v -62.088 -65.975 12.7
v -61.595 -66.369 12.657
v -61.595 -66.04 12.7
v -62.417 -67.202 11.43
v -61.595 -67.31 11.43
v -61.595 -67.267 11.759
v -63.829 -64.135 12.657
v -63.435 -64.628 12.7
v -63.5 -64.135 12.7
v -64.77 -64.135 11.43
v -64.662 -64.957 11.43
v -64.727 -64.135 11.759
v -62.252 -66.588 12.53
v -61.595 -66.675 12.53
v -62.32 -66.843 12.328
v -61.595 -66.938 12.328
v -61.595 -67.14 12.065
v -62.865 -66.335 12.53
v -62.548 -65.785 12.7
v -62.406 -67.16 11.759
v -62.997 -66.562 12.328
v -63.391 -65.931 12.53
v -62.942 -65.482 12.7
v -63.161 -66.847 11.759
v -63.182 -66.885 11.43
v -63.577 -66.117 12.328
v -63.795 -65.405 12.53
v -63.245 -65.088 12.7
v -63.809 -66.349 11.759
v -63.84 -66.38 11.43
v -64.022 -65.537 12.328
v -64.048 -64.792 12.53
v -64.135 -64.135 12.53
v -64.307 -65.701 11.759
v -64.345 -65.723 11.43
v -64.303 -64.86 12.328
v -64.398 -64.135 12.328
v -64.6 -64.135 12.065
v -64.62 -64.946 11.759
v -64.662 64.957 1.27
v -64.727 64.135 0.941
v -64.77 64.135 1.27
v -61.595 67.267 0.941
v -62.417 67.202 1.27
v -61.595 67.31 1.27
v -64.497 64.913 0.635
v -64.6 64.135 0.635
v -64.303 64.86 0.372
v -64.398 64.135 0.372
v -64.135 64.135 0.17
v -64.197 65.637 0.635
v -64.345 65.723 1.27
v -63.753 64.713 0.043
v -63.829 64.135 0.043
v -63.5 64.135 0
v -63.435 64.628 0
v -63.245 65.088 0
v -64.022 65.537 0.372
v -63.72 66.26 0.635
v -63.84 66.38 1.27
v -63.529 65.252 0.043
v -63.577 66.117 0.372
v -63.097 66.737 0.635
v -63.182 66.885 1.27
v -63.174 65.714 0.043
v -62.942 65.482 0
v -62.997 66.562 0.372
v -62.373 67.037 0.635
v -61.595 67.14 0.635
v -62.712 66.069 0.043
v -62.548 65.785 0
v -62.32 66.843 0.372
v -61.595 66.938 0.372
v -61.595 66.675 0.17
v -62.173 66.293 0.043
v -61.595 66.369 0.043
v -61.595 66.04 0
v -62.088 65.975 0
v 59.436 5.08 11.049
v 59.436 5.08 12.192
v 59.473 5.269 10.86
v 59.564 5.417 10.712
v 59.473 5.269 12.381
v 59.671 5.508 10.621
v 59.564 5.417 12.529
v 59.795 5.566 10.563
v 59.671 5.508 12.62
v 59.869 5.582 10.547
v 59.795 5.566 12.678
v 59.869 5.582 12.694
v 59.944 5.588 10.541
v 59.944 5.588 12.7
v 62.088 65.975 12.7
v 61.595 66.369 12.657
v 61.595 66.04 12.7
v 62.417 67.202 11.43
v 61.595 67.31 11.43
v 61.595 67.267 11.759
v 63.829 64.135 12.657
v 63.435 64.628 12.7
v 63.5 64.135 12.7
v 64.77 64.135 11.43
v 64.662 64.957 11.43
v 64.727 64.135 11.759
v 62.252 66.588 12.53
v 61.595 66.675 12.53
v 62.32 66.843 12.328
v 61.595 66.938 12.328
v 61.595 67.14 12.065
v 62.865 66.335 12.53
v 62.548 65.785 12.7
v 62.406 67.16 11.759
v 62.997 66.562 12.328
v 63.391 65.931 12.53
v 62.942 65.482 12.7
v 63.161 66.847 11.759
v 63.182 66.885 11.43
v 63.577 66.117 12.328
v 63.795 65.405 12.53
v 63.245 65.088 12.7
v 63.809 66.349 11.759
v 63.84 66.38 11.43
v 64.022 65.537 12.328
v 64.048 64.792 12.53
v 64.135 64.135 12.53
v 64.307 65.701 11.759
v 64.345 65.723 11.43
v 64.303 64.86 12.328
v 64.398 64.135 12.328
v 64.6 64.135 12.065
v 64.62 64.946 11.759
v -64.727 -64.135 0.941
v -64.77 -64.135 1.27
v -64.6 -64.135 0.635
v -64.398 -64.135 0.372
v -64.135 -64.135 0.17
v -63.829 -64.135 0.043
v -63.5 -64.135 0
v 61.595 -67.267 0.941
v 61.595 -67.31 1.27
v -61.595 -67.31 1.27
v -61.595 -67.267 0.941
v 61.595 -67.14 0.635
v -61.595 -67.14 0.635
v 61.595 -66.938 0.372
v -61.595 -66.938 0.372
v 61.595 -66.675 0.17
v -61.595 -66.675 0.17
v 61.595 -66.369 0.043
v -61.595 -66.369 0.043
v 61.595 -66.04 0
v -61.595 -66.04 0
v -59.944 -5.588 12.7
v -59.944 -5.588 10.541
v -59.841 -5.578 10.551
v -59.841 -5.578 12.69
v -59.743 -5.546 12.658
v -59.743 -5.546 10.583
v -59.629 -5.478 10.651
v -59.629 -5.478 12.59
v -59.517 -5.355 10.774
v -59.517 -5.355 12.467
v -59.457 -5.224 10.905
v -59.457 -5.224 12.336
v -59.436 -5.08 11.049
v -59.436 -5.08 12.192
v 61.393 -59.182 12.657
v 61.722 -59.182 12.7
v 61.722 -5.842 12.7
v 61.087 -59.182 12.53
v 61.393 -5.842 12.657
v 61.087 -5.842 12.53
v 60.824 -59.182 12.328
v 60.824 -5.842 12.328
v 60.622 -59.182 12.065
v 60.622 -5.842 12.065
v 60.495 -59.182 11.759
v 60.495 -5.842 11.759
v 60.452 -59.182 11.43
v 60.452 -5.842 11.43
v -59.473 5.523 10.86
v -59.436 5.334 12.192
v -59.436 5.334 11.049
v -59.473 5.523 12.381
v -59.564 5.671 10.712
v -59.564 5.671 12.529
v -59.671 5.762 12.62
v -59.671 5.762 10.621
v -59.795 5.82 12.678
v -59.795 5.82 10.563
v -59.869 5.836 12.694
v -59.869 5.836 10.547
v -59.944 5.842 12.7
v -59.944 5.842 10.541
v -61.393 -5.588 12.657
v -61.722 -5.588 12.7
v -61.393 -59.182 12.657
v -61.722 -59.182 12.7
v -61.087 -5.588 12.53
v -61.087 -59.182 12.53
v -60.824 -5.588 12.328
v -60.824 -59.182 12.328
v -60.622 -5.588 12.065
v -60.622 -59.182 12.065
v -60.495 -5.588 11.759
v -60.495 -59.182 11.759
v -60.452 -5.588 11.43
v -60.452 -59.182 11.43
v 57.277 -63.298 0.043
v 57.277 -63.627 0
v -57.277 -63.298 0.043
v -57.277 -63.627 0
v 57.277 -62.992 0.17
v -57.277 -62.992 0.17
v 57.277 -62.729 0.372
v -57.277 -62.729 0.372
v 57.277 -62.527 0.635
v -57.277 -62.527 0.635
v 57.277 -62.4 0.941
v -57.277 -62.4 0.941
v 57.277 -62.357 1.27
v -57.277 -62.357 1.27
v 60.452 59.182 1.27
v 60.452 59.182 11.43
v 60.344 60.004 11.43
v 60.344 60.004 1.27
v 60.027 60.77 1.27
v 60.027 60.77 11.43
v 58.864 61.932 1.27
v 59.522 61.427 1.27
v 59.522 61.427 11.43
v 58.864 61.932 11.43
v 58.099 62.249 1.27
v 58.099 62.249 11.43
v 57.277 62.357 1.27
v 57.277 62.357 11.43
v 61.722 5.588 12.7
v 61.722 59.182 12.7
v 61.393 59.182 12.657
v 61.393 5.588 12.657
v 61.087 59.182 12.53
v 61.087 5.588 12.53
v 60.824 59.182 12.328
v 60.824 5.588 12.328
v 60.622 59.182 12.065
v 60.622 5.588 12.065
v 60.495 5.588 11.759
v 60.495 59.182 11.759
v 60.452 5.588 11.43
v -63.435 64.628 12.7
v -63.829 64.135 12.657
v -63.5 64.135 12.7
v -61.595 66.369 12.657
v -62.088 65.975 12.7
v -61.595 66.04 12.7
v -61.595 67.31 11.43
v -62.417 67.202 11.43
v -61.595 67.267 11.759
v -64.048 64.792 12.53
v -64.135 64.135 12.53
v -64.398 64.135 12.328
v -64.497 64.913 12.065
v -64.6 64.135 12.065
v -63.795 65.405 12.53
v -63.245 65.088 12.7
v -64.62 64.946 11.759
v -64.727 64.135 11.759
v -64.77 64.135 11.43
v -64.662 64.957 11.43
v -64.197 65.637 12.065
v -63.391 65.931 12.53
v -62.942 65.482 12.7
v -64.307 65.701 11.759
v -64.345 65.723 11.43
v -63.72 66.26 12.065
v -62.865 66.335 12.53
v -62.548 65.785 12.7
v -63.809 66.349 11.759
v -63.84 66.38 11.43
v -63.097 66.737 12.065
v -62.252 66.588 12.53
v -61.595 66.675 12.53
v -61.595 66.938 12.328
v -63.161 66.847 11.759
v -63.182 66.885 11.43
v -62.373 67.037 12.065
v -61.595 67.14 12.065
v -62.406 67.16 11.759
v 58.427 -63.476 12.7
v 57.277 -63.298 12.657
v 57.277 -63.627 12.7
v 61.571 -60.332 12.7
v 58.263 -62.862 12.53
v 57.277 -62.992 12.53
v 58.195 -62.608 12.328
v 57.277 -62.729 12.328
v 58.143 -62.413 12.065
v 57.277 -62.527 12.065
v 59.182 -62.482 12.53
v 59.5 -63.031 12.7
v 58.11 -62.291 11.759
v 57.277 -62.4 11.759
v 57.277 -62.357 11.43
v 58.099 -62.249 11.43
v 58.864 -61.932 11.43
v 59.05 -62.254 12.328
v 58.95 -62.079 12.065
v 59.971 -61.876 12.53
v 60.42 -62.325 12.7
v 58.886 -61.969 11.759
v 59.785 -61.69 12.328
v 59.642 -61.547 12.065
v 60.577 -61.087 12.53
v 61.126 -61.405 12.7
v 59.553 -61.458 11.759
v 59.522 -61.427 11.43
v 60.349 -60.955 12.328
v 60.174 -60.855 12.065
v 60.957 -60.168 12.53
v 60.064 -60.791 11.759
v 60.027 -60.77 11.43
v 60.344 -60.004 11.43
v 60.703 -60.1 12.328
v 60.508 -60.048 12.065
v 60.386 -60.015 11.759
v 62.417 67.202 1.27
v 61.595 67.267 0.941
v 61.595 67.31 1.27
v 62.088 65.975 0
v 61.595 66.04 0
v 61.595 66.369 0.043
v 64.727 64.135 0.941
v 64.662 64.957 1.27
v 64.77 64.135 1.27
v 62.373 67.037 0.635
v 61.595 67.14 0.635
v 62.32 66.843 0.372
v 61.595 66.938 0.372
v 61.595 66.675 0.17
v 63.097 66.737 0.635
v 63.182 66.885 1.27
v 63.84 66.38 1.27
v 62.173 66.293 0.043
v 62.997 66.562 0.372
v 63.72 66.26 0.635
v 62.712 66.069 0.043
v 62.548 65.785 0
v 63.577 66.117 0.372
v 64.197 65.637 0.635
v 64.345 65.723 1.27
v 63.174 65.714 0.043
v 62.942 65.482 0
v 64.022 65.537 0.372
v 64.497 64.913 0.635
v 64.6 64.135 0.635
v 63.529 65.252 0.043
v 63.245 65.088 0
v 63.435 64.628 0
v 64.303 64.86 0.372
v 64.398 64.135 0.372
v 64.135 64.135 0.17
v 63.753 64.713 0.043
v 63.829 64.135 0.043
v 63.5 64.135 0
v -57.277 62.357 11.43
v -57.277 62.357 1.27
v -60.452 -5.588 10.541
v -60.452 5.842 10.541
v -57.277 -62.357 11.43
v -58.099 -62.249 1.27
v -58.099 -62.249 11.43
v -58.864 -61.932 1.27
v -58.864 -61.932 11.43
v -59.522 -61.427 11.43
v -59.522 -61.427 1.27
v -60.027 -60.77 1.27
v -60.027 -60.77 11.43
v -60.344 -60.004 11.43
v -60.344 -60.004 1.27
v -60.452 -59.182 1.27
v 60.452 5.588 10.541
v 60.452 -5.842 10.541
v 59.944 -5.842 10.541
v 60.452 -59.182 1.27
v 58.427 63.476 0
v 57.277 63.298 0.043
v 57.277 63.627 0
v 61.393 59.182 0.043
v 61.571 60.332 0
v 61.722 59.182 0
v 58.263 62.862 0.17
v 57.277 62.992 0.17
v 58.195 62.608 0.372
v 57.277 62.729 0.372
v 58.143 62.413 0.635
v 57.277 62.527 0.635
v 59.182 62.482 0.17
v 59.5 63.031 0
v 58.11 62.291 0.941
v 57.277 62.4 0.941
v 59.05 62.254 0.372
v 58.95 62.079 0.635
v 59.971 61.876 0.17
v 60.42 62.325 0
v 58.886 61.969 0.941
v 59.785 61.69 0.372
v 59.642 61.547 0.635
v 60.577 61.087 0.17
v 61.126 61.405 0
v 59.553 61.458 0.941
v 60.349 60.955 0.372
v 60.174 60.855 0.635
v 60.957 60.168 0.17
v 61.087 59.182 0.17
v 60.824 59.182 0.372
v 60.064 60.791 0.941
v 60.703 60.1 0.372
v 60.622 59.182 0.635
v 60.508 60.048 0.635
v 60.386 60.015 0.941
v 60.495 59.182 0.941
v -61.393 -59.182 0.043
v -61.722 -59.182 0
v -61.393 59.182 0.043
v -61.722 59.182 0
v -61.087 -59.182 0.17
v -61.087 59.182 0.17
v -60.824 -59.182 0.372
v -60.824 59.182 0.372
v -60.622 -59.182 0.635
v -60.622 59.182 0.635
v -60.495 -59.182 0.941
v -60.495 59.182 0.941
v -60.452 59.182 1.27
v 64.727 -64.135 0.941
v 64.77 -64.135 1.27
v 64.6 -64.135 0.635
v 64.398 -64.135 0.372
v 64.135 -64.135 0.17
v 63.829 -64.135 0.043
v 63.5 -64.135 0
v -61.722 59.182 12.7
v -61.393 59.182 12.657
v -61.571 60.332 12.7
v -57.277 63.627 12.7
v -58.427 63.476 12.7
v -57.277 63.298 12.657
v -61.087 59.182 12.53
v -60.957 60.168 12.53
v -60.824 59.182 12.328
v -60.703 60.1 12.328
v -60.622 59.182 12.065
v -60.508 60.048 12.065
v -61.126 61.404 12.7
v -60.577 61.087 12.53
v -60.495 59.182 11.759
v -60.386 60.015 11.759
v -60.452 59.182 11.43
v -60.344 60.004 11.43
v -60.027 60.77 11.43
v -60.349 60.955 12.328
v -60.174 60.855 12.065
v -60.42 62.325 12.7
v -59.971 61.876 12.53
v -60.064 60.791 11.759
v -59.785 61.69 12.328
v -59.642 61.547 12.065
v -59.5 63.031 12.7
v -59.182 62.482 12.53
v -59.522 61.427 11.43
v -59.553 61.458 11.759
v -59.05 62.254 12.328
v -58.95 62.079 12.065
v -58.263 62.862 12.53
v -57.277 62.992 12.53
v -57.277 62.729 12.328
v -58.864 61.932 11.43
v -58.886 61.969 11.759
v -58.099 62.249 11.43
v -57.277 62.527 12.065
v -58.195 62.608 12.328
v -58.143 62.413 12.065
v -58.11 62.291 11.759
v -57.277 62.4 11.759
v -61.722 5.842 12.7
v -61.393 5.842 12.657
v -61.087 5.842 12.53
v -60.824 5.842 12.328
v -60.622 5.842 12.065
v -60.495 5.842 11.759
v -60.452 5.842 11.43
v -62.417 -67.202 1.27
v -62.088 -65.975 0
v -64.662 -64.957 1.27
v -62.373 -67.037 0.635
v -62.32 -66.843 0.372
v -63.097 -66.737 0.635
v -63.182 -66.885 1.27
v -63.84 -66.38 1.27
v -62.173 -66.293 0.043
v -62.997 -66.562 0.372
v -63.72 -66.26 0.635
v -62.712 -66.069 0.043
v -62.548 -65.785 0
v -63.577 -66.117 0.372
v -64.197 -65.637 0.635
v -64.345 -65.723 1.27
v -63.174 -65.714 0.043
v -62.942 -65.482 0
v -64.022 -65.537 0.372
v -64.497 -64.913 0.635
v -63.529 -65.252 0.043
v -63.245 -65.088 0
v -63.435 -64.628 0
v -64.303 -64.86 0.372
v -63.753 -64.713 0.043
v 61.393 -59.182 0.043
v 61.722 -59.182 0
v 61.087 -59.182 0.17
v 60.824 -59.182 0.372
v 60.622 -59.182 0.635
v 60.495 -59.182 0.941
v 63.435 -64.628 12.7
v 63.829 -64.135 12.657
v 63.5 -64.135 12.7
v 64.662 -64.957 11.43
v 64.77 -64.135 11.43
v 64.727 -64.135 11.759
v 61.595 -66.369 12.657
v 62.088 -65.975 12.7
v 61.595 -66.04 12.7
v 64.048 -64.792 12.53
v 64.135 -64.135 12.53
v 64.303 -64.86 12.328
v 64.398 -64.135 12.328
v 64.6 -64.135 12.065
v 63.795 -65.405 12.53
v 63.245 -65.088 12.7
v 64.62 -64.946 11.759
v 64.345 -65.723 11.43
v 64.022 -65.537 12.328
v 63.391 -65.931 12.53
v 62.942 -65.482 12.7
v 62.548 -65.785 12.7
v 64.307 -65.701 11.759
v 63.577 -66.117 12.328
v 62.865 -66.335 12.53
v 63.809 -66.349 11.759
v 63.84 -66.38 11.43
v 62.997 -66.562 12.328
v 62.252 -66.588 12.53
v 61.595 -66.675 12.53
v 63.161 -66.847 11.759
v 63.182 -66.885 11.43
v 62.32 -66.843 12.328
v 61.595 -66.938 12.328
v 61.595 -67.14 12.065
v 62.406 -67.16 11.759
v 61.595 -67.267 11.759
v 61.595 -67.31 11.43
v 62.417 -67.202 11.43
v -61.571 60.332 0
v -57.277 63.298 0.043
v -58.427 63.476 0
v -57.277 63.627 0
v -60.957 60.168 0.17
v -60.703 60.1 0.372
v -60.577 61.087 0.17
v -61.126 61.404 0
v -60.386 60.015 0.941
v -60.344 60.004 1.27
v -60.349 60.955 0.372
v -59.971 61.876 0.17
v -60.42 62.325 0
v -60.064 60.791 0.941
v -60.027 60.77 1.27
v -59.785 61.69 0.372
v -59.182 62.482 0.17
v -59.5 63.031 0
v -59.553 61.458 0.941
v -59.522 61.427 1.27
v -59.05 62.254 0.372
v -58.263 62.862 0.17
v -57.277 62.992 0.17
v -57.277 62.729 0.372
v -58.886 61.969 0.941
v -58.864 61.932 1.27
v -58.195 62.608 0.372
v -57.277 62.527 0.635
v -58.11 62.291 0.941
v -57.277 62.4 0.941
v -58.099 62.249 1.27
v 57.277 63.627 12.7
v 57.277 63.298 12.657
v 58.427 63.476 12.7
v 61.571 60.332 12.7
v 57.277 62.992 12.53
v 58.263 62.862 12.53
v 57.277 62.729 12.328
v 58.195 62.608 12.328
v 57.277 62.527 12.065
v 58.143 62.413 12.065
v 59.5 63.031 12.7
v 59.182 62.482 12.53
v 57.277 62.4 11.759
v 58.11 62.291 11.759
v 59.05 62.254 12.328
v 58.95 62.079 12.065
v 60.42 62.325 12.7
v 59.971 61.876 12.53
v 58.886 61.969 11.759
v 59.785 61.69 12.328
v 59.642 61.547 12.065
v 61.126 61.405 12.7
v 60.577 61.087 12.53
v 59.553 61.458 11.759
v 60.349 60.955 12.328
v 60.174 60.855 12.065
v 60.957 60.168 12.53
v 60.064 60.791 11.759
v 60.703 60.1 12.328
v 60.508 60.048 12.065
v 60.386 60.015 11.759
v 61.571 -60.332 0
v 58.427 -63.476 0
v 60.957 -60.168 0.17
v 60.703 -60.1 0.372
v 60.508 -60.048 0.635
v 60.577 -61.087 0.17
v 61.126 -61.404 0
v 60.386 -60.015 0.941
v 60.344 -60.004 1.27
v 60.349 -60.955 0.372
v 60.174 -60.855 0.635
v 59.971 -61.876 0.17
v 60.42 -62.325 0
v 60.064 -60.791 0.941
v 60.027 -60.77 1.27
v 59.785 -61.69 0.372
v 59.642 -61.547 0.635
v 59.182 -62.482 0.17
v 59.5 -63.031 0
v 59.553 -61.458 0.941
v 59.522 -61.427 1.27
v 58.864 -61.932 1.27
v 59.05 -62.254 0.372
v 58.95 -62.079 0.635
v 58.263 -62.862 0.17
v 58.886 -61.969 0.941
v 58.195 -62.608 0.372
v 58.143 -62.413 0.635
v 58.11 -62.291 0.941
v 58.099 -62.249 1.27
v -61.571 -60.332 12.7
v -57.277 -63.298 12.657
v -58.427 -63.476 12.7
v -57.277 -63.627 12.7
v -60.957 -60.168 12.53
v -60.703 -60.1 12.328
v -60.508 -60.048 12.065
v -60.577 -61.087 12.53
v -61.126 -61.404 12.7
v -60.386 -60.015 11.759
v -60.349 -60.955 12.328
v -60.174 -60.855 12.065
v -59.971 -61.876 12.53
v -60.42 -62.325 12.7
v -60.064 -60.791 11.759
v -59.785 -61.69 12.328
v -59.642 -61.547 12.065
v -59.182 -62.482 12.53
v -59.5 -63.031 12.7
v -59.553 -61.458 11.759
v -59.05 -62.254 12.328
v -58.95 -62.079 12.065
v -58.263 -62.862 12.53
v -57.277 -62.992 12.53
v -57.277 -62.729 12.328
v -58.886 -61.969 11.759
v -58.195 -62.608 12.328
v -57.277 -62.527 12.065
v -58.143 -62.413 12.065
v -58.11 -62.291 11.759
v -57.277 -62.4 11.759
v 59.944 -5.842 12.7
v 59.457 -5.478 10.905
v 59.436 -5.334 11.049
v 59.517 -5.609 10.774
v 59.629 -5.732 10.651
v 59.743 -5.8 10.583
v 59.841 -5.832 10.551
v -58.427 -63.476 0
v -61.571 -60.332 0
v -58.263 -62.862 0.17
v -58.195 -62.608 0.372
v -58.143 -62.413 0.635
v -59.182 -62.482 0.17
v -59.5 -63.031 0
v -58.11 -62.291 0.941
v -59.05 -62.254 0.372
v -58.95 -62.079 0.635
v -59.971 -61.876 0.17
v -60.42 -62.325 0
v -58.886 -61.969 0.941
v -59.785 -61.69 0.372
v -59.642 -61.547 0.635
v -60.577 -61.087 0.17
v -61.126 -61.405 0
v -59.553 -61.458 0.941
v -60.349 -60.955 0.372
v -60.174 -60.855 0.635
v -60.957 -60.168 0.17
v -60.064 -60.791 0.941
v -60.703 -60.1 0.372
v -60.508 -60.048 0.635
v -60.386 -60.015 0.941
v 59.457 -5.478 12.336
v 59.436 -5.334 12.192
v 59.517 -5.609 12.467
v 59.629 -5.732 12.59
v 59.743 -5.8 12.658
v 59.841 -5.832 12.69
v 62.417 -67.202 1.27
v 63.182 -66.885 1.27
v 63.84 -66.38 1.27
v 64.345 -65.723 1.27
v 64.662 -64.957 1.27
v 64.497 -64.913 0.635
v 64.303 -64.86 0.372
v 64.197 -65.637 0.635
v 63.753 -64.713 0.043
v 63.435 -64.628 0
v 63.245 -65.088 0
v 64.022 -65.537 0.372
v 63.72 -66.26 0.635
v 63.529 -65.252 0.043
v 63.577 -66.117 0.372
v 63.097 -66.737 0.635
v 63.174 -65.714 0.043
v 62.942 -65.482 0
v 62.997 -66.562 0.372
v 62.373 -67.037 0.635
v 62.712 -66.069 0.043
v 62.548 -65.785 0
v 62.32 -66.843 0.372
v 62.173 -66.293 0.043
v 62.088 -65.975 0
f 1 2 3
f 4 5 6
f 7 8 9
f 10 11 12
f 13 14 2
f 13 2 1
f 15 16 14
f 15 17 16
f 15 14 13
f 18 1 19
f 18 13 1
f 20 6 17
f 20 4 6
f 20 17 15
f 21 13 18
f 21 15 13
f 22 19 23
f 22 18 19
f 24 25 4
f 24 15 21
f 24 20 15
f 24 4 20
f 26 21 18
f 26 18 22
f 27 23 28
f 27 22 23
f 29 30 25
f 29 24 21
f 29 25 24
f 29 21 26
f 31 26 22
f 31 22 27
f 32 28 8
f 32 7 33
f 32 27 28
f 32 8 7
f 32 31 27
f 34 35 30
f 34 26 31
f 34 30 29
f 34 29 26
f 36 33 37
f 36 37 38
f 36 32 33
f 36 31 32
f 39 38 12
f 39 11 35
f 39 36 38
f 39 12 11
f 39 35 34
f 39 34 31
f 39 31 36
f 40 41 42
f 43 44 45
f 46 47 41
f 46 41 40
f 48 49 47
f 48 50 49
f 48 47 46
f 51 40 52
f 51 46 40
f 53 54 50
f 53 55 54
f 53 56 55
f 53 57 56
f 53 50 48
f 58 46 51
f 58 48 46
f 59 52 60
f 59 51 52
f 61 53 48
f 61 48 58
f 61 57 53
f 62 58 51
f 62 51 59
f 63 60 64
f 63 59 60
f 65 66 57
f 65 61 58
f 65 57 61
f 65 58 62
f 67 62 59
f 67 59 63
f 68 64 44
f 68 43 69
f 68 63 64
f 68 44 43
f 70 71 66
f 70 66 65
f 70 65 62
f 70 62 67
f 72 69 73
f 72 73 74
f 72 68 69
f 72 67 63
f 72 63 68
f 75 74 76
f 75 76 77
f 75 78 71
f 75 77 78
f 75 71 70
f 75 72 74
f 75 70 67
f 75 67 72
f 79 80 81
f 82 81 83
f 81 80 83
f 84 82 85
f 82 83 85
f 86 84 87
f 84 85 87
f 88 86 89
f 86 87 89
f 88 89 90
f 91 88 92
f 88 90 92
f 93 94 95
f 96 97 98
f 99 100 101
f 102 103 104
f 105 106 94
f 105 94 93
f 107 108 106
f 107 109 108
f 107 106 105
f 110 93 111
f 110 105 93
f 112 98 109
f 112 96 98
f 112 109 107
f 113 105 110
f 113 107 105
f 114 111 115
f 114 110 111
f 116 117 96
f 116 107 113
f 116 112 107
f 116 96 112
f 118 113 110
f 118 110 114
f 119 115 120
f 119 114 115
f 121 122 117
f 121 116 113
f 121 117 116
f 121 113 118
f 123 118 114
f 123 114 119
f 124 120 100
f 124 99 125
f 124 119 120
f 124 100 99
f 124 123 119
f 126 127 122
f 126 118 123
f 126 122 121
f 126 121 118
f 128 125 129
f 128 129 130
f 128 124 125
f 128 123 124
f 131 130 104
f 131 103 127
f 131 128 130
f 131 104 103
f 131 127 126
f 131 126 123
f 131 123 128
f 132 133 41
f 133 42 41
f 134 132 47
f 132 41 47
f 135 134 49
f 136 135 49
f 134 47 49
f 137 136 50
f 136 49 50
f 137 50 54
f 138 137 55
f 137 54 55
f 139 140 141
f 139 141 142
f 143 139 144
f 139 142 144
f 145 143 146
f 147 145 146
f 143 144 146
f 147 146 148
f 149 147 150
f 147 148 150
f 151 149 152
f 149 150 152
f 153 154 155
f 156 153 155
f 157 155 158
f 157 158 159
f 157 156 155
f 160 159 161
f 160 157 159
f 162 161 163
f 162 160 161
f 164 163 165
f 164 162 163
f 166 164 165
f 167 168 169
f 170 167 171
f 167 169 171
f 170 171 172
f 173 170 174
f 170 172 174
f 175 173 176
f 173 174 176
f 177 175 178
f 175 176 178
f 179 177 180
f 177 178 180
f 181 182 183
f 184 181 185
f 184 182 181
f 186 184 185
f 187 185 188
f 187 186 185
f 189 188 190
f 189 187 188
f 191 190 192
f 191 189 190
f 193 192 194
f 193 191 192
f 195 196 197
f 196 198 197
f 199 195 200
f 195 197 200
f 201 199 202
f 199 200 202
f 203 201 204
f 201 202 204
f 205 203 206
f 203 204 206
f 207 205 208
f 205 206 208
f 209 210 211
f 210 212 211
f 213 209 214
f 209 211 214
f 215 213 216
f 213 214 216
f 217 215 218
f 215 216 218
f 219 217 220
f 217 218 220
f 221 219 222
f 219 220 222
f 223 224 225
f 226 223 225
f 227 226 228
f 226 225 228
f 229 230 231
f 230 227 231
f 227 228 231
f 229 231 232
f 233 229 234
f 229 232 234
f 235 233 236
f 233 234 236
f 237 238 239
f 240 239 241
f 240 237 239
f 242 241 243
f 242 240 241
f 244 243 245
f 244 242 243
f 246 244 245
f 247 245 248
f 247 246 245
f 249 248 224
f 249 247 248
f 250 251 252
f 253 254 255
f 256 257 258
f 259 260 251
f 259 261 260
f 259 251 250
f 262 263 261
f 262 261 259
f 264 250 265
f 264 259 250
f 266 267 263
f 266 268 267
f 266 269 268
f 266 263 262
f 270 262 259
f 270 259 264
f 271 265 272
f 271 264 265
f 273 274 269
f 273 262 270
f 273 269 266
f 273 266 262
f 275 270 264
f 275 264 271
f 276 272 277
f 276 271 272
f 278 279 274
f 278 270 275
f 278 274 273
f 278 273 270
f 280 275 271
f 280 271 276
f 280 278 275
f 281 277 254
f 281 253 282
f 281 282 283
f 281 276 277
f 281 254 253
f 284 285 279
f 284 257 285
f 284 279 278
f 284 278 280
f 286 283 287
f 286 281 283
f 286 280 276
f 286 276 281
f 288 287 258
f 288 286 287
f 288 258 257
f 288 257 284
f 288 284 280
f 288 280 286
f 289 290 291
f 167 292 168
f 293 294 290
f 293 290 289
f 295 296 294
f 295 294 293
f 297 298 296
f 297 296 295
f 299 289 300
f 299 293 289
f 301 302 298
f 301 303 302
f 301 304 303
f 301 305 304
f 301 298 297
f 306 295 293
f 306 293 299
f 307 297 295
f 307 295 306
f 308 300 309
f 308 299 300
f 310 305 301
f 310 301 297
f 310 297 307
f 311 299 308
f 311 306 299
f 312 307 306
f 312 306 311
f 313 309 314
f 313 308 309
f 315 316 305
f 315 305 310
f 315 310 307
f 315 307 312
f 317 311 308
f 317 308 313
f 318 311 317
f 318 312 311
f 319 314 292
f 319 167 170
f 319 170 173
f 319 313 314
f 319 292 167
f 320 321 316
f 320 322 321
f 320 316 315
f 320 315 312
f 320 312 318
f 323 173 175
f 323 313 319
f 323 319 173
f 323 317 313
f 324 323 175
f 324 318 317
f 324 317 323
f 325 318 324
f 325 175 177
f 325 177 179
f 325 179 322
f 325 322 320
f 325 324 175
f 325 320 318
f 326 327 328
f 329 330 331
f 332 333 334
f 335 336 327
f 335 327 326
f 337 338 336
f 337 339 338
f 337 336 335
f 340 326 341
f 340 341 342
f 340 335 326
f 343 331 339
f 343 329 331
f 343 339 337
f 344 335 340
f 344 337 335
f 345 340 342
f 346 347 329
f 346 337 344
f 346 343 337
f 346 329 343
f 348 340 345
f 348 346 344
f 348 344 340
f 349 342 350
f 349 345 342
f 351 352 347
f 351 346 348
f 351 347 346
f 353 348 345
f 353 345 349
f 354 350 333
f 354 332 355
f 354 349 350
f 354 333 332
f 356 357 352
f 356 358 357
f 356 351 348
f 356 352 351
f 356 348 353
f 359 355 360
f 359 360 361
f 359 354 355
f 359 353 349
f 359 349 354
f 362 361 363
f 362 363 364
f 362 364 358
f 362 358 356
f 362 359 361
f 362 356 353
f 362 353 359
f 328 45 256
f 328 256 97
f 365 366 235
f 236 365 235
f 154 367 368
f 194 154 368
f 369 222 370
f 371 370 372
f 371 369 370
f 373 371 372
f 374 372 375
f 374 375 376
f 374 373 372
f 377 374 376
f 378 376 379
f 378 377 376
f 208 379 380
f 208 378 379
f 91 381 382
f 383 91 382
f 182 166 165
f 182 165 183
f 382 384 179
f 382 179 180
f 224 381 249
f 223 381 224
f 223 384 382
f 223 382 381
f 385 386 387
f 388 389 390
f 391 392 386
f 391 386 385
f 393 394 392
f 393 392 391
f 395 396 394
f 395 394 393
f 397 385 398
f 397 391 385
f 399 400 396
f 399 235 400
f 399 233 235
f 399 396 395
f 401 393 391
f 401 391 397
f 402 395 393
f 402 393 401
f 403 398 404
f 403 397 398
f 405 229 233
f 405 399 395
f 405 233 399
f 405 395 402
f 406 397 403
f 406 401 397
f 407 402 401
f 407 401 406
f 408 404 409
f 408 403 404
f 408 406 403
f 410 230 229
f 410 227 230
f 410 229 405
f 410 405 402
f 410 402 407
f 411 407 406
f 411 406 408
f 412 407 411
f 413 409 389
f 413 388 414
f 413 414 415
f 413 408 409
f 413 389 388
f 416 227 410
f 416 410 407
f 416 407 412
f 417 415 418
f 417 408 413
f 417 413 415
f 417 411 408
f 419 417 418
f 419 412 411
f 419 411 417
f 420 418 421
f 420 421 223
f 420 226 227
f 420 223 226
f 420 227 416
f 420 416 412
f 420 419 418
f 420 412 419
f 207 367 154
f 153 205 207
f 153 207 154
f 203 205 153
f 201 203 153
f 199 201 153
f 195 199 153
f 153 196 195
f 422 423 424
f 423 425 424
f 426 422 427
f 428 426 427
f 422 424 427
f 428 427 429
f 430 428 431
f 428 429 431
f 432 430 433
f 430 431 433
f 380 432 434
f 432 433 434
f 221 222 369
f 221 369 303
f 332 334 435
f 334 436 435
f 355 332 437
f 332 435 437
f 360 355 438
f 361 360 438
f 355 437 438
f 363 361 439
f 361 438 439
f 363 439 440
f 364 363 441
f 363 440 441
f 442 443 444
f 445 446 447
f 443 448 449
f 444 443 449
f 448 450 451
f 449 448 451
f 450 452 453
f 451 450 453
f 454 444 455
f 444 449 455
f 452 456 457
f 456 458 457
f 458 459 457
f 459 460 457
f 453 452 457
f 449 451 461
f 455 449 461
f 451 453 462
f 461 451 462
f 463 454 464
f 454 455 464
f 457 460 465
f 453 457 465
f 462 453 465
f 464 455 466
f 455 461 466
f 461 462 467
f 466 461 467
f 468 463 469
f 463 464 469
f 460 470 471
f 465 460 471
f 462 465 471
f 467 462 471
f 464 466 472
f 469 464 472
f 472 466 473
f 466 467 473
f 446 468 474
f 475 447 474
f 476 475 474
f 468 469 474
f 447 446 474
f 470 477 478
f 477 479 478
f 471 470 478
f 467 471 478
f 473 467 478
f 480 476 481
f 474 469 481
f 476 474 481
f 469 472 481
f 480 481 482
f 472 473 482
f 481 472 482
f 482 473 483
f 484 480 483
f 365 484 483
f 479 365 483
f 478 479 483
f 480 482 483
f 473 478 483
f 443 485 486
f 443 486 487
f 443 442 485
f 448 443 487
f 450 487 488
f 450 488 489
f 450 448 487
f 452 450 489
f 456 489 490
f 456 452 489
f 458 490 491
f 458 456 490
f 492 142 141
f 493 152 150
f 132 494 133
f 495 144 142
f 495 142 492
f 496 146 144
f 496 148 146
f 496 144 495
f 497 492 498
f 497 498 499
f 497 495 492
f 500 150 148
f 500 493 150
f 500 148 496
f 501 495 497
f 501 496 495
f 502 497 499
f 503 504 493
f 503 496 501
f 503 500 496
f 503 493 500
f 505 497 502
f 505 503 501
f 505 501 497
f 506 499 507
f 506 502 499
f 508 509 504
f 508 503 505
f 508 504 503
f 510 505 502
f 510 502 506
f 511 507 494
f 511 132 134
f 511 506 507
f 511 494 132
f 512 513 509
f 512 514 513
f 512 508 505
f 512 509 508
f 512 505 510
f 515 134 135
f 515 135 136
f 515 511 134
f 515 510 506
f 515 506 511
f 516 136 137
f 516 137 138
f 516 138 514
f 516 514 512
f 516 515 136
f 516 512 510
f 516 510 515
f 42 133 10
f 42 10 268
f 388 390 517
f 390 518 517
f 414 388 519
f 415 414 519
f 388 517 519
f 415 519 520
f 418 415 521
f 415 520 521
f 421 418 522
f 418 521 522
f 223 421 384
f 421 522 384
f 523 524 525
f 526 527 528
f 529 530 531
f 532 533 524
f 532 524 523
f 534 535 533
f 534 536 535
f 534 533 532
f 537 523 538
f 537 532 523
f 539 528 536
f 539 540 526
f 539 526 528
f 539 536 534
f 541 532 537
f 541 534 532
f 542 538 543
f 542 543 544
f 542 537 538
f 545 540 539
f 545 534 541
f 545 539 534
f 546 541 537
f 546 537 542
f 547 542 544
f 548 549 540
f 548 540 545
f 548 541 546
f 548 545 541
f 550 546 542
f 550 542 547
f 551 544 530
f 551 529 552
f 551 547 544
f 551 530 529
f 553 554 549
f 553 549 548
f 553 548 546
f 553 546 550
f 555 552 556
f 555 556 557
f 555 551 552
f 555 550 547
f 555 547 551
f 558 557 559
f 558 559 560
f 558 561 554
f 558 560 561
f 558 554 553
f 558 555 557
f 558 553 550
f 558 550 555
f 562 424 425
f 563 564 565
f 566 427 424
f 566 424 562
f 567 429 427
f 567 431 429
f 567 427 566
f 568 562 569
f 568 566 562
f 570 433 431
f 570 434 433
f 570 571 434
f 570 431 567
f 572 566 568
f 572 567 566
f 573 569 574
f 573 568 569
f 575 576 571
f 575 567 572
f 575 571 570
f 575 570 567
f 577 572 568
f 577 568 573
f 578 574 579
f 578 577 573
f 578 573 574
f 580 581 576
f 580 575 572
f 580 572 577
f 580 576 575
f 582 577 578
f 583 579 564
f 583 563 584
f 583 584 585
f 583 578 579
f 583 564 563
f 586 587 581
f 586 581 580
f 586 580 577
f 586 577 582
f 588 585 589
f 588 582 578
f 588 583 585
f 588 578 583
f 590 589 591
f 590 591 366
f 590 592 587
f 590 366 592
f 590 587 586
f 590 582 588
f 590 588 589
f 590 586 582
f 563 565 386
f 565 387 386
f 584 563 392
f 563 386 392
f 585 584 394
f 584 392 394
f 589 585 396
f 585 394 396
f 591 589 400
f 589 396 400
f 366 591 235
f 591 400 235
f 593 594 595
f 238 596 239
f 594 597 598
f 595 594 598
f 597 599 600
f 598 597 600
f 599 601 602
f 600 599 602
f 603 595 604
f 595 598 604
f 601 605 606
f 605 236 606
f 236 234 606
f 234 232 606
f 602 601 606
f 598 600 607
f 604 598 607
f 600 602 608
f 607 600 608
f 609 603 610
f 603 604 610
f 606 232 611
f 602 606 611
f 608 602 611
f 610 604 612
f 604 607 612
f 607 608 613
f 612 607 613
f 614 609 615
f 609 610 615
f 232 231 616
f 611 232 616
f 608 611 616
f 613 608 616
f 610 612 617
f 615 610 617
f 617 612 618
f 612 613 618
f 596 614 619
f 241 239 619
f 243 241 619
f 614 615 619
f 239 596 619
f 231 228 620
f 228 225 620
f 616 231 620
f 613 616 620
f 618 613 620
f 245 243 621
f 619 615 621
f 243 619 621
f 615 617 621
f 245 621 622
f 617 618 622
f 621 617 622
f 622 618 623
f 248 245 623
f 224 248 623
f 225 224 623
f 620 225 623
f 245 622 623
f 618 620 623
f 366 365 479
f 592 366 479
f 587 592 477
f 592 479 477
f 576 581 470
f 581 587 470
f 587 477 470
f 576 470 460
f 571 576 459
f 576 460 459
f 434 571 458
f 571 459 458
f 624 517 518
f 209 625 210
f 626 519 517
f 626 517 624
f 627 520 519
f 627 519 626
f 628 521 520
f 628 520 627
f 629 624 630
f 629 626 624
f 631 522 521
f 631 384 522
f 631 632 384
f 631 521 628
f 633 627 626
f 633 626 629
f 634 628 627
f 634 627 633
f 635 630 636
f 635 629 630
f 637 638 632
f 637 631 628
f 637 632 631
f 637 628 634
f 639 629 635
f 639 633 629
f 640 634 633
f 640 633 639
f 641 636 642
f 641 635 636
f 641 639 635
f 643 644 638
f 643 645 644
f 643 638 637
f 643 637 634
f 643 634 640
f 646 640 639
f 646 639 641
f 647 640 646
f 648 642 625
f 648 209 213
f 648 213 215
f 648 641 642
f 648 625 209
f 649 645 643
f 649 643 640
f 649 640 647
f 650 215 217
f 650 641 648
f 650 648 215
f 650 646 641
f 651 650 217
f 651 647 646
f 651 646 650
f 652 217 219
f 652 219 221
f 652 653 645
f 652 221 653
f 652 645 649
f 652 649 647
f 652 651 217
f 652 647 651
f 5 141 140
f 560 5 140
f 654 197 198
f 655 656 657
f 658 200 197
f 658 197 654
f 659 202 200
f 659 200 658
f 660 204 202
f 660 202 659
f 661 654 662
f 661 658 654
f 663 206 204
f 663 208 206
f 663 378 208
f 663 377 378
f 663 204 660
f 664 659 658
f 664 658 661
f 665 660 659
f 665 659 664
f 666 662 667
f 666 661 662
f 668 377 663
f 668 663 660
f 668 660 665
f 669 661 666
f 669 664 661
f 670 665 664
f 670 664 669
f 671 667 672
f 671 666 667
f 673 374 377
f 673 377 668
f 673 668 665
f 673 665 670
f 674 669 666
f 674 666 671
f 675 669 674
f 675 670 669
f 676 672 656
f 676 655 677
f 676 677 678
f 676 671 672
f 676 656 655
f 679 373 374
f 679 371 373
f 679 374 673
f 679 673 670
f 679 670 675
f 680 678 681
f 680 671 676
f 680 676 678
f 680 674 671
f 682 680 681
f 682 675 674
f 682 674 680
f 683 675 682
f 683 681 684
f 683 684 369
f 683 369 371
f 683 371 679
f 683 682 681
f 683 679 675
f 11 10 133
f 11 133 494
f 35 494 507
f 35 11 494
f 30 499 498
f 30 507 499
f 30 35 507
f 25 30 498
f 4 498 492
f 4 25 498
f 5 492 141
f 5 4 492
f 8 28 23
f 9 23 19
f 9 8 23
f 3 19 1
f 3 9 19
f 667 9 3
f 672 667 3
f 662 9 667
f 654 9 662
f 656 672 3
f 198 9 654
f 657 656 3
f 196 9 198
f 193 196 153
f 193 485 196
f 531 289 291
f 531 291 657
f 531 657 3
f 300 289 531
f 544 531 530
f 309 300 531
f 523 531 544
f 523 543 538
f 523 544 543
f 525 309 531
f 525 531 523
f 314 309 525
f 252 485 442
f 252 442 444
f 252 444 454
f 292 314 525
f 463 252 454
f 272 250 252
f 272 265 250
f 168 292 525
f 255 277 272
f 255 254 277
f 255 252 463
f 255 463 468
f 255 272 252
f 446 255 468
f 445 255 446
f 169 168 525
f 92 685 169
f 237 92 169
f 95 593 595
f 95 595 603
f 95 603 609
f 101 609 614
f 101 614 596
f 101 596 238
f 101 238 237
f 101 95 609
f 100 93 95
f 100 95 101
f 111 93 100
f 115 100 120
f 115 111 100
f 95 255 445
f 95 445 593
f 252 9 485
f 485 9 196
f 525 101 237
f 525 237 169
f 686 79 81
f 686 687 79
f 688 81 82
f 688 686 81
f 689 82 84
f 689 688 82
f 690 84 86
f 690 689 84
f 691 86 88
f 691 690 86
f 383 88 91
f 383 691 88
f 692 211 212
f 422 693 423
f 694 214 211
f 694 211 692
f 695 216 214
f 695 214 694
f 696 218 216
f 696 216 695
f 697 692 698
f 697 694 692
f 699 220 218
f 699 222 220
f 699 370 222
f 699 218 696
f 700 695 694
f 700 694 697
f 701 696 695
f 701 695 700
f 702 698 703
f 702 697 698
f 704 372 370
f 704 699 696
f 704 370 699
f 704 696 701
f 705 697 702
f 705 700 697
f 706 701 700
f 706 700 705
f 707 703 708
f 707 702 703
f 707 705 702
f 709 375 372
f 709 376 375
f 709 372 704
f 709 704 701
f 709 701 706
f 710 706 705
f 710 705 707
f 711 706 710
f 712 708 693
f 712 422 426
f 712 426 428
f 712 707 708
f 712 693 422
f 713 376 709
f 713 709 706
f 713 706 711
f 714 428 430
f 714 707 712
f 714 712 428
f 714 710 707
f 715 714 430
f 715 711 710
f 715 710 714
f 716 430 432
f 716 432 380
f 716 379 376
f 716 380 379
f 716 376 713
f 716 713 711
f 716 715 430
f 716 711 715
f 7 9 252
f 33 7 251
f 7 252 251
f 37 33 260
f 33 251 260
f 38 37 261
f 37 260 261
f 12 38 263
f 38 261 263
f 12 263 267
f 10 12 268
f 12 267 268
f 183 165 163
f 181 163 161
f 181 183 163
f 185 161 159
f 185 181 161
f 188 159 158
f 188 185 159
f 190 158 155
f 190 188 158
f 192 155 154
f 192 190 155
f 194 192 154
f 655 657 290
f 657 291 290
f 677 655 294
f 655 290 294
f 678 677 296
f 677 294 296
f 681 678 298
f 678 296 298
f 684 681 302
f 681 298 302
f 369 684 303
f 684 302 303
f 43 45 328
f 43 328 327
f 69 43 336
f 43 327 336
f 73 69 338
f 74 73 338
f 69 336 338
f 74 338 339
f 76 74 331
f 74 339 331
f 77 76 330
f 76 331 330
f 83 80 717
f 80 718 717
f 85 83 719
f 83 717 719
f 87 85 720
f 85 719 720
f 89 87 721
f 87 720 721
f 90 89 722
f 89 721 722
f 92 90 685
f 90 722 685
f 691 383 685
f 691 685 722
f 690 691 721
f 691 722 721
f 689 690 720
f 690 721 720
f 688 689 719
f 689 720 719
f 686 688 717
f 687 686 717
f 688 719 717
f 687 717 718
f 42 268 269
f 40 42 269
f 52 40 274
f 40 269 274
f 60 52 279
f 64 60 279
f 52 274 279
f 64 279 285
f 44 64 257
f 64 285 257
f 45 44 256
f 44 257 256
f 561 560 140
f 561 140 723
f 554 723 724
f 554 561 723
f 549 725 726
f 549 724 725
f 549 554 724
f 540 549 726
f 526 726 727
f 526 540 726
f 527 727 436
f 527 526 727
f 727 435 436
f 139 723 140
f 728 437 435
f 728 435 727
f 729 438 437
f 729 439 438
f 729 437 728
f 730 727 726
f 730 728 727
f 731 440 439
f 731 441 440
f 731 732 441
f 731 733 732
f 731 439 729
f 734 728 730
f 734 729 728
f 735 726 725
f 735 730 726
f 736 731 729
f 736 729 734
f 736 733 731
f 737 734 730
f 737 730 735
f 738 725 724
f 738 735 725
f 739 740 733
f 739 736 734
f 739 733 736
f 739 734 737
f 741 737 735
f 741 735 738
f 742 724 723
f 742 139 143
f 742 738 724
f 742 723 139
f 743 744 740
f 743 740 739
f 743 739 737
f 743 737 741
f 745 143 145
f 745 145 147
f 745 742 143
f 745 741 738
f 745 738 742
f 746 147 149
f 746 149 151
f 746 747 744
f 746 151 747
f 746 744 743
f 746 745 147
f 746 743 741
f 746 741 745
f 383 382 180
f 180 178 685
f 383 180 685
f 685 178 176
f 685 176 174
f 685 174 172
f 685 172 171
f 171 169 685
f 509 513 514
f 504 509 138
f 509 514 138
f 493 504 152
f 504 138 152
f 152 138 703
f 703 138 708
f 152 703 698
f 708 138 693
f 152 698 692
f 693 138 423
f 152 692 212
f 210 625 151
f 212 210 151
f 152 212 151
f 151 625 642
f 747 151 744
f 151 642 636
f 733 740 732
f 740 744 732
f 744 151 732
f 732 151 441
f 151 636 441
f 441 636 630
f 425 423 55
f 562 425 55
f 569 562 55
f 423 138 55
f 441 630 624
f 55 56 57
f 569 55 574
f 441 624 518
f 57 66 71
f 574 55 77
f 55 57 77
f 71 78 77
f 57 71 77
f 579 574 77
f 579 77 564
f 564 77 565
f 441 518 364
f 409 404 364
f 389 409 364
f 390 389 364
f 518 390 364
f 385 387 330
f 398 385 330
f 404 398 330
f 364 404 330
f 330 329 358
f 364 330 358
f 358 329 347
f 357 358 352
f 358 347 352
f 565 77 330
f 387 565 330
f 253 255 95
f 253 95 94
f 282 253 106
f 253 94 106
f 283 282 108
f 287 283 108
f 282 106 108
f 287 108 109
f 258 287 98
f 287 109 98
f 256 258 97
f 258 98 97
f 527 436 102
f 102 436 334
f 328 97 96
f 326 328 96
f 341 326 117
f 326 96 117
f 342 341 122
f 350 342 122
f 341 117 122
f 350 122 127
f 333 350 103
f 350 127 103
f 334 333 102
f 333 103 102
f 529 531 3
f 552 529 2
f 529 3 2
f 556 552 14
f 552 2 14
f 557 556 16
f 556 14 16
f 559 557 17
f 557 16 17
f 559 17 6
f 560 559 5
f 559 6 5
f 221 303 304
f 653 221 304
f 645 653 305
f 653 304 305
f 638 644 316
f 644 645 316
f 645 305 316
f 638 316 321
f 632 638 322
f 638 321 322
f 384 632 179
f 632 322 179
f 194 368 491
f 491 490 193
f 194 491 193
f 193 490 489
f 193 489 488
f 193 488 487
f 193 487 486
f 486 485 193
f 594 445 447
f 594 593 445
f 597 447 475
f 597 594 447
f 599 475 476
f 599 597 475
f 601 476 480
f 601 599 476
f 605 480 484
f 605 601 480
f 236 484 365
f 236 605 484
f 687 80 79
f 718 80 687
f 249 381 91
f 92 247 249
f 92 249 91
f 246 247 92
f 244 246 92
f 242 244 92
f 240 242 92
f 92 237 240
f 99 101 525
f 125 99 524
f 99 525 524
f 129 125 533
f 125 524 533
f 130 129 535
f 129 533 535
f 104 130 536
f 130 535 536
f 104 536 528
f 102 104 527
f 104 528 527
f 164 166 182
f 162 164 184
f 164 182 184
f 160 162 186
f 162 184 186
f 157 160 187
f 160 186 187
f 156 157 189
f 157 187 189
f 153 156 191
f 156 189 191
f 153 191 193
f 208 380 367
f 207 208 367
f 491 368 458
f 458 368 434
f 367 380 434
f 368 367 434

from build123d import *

# Parameters (mm, degrees)
F0_W     = 129.54
F0_H     = 134.62
F0_W_2   = 120.904
F0_H_2   = 124.714
F1_DEPTH = 12.7
F2_R     = 3.175
F4_W     = 11.43
F4_H     = 2.159
F5_DEPTH = 1.016
F3_W     = 11.43
F3_H     = 2.159
F6_DEPTH = 1.016
F7_R     = 1.27
F8_R     = 0.508
F10_R    = 1.27


with BuildPart() as f1:
    # F0 (on Top) → F1 (new body)
    with BuildSketch(Plane.XY):
        Rectangle(F0_W, F0_H)
        Rectangle(F0_W_2, F0_H_2, mode=Mode.SUBTRACT)
    extrude(amount=F1_DEPTH)

    # F2
    f2_edges = [f1.edges().sort_by_distance(p)[0] for p in [
        (-60.452, 62.357, 6.35),
        (-60.452, -62.357, 6.35),
        (60.452, 62.357, 6.35),
        (60.452, -62.357, 6.35),
        (-64.77, 67.31, 6.35),
        (64.77, 67.31, 6.35),
        (-64.77, -67.31, 6.35),
        (64.77, -67.31, 6.35),
    ]]
    fillet(f2_edges, radius=F2_R)

    # F4 (on face) → F5 (join)
    with BuildSketch(Plane(origin=(60.452, 0, 0), x_dir=(0, -1, 0), z_dir=(-1, 0, 0))):
        with Locations((0.127, 11.6205)):
            Rectangle(F4_W, F4_H)
    extrude(amount=F5_DEPTH)

    # F3 (on face) → F6 (join)
    with BuildSketch(Plane.YZ.offset(-60.452)):
        with Locations((0.127, 11.6205)):
            Rectangle(F3_W, F3_H)
    extrude(amount=F6_DEPTH)

    # F7
    f7_edges = [f1.edges().sort_by_distance(p)[0] for p in [
        (0, -62.357, 12.7),
        (0, 62.357, 0),
        (-64.77, 0, 0),
        (-60.452, 32.512, 12.7),
    ]]
    fillet(f7_edges, radius=F7_R)

    # F8
    f8_edges = [f1.edges().sort_by_distance(p)[0] for p in [
        (-59.436, 5.842, 11.6205),
        (-59.436, -5.588, 11.6205),
        (-59.436, 0.127, 10.541),
        (-59.436, 0.127, 12.7),
        (59.436, 5.588, 11.6205),
        (59.436, -5.842, 11.6205),
        (59.436, -0.127, 12.7),
        (59.436, -0.127, 10.541),
    ]]
    fillet(f8_edges, radius=F8_R)

    # F10
    f10_edges = [f1.edges().sort_by_distance(p)[0] for p in [
        (0, 67.31, 12.7),
        (-63.840064, 66.380064, 12.7),
        (-64.77, 0, 12.7),
        (-63.840064, -66.380064, 12.7),
        (0, -67.31, 12.7),
        (63.840064, -66.380064, 12.7),
        (64.77, 0, 12.7),
        (63.840064, 66.380064, 12.7),
    ]]
    fillet(f10_edges, radius=F10_R)


solid = f1.part
